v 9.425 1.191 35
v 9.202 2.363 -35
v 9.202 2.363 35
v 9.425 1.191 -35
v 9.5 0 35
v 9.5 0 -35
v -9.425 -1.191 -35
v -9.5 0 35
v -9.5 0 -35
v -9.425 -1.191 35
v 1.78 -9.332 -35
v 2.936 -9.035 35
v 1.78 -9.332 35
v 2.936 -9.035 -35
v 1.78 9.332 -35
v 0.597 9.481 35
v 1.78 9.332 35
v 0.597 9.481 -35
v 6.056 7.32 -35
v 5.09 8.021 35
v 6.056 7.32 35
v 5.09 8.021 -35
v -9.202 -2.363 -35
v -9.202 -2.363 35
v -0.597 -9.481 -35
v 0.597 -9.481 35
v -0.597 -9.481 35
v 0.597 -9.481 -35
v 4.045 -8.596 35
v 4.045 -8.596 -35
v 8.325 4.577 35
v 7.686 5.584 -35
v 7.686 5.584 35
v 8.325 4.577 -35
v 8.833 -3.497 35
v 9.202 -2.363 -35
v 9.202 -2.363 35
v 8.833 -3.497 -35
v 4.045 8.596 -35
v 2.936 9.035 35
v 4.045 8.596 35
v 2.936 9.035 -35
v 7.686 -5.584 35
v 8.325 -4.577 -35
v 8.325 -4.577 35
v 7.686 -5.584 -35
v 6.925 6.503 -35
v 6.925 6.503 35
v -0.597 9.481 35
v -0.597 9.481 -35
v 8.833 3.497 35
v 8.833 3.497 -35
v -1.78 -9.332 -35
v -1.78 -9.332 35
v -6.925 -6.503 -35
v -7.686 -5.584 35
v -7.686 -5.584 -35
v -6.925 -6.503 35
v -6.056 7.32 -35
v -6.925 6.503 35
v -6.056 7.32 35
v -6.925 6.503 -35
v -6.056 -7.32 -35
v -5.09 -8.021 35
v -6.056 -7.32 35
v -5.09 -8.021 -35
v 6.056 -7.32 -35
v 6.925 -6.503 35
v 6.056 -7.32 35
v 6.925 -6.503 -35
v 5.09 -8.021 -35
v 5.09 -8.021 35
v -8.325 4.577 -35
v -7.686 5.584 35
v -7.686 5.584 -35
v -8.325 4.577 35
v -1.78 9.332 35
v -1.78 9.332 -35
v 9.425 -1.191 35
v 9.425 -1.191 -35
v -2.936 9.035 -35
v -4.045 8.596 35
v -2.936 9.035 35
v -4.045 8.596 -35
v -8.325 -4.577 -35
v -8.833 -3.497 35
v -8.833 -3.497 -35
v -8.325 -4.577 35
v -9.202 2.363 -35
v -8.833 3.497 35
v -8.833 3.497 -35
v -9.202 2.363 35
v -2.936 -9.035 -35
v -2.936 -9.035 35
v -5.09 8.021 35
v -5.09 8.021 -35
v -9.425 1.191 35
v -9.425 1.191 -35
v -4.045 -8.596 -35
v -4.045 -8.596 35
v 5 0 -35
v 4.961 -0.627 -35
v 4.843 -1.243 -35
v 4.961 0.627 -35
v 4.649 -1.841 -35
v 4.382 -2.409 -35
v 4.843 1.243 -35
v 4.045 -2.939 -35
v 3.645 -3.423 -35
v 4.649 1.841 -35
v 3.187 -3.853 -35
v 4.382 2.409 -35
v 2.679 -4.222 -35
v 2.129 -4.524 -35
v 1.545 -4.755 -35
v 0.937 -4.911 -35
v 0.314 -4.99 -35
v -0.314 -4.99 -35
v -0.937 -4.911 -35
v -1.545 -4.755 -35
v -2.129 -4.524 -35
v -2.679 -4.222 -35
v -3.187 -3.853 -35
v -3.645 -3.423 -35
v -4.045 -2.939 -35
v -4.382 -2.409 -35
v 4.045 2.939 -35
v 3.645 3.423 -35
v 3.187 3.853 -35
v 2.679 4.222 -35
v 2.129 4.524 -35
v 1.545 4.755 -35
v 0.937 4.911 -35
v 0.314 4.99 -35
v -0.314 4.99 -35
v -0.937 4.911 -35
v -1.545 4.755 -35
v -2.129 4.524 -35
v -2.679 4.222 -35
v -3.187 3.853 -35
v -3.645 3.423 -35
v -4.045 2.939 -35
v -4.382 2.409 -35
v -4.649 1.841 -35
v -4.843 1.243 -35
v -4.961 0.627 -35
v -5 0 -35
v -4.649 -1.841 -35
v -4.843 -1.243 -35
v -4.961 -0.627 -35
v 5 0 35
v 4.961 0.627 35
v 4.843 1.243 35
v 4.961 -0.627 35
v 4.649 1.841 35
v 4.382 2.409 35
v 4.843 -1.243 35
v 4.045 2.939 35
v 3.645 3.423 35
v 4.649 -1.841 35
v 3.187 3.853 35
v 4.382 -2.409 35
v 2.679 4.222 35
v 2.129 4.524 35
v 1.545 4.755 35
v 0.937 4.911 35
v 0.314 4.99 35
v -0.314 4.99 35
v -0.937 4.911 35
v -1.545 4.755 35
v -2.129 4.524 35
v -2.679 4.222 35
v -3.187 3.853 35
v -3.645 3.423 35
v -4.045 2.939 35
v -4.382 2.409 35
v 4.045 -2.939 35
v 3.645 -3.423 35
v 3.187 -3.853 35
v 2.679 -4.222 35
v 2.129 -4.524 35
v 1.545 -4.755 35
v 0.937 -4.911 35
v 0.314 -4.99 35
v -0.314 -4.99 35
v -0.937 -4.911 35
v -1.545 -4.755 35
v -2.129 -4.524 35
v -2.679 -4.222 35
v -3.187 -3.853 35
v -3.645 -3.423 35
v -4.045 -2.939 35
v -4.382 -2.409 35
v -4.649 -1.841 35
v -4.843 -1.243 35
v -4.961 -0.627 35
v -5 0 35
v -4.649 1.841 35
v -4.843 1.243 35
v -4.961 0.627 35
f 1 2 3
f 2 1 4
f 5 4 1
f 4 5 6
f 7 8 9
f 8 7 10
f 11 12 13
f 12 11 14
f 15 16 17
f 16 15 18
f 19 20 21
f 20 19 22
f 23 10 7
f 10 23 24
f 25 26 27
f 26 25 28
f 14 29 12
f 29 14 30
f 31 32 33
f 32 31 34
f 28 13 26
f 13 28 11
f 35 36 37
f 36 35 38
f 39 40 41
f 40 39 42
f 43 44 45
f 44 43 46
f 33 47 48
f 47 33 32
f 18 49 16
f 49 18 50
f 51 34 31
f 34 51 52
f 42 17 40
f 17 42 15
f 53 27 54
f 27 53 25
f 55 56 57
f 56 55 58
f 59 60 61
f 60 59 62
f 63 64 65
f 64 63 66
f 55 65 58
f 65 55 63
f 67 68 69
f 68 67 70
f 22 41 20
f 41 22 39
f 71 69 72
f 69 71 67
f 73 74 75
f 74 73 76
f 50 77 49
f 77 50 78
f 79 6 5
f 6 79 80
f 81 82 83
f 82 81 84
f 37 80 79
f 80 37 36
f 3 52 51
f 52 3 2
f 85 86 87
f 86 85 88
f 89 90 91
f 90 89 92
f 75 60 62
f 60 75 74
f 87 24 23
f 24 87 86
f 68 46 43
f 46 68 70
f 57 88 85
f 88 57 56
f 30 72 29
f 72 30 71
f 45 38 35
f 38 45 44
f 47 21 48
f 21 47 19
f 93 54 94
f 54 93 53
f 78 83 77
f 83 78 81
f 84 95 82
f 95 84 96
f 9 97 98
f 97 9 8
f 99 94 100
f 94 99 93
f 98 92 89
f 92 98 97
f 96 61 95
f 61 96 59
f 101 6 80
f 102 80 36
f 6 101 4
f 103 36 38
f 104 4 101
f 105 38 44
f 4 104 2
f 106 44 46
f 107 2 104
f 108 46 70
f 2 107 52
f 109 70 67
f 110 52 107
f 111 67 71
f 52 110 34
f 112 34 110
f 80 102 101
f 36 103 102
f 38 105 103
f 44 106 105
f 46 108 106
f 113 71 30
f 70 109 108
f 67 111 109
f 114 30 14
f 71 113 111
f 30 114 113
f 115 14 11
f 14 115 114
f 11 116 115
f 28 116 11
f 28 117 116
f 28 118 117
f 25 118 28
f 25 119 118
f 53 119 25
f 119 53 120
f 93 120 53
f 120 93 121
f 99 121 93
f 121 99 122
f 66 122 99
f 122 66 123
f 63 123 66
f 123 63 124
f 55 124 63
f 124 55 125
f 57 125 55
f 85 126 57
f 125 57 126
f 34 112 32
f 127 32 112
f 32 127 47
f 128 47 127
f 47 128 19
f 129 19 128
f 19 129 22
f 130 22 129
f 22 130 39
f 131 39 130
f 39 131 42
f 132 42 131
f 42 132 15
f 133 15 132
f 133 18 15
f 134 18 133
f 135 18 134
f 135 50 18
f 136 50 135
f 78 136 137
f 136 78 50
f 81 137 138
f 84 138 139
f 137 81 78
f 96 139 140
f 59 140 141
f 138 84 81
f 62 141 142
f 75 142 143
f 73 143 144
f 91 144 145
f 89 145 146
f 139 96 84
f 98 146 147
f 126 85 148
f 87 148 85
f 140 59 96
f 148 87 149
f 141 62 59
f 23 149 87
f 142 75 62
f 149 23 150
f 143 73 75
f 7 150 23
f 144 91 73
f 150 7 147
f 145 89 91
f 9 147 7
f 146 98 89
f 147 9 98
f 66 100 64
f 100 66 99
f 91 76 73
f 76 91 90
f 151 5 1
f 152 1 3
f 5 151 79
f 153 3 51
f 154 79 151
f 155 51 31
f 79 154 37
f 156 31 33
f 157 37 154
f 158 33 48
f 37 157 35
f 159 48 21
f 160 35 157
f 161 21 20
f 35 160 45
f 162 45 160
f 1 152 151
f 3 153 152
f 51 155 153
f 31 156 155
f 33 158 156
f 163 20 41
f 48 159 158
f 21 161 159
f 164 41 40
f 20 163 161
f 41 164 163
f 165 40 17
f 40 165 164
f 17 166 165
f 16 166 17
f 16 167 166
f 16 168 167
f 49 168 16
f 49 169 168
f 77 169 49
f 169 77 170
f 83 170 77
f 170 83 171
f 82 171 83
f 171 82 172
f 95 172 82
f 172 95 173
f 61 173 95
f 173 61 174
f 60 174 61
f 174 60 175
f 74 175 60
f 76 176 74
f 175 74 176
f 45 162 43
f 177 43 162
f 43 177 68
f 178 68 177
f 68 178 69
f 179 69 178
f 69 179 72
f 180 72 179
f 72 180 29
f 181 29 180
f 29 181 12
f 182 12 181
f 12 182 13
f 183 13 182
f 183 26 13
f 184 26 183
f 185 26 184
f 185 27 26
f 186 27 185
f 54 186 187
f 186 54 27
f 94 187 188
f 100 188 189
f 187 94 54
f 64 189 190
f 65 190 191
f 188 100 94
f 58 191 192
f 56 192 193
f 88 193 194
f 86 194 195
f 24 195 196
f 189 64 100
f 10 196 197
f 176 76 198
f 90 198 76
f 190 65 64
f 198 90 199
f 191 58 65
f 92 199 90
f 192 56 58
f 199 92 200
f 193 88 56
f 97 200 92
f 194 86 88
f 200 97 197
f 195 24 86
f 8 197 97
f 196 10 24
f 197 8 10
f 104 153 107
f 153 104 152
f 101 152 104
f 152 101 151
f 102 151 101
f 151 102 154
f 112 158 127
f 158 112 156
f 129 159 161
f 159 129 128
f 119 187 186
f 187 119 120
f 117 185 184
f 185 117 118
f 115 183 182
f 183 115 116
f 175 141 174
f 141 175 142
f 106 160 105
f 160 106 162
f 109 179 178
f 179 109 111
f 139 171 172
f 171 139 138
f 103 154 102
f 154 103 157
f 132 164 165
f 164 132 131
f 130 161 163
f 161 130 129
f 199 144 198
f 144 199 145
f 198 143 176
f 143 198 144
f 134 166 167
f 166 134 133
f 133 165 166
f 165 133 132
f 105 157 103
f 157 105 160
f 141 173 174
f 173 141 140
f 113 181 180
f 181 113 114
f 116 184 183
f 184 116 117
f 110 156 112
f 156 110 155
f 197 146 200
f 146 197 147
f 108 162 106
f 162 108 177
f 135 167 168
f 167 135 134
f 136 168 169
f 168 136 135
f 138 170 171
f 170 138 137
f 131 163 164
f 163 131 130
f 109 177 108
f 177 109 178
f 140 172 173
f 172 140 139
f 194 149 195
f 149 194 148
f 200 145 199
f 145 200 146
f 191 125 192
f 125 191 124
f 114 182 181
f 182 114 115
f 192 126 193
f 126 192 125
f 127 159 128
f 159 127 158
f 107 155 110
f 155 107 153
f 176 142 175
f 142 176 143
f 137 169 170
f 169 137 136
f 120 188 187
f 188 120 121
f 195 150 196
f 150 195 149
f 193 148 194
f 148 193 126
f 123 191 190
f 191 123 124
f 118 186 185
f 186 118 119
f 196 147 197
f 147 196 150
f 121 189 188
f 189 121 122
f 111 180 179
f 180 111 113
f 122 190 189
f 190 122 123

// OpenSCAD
$fn = 50;


difference() {
	union() {
		translate(v = [0, 0, -35.0000000000]) {
			cylinder(h = 70, r = 9.5000000000);
		}
	}
	union() {
		translate(v = [0, 0, -100.0000000000]) {
			cylinder(h = 200, r = 5.0000000000);
		}
	}
}
